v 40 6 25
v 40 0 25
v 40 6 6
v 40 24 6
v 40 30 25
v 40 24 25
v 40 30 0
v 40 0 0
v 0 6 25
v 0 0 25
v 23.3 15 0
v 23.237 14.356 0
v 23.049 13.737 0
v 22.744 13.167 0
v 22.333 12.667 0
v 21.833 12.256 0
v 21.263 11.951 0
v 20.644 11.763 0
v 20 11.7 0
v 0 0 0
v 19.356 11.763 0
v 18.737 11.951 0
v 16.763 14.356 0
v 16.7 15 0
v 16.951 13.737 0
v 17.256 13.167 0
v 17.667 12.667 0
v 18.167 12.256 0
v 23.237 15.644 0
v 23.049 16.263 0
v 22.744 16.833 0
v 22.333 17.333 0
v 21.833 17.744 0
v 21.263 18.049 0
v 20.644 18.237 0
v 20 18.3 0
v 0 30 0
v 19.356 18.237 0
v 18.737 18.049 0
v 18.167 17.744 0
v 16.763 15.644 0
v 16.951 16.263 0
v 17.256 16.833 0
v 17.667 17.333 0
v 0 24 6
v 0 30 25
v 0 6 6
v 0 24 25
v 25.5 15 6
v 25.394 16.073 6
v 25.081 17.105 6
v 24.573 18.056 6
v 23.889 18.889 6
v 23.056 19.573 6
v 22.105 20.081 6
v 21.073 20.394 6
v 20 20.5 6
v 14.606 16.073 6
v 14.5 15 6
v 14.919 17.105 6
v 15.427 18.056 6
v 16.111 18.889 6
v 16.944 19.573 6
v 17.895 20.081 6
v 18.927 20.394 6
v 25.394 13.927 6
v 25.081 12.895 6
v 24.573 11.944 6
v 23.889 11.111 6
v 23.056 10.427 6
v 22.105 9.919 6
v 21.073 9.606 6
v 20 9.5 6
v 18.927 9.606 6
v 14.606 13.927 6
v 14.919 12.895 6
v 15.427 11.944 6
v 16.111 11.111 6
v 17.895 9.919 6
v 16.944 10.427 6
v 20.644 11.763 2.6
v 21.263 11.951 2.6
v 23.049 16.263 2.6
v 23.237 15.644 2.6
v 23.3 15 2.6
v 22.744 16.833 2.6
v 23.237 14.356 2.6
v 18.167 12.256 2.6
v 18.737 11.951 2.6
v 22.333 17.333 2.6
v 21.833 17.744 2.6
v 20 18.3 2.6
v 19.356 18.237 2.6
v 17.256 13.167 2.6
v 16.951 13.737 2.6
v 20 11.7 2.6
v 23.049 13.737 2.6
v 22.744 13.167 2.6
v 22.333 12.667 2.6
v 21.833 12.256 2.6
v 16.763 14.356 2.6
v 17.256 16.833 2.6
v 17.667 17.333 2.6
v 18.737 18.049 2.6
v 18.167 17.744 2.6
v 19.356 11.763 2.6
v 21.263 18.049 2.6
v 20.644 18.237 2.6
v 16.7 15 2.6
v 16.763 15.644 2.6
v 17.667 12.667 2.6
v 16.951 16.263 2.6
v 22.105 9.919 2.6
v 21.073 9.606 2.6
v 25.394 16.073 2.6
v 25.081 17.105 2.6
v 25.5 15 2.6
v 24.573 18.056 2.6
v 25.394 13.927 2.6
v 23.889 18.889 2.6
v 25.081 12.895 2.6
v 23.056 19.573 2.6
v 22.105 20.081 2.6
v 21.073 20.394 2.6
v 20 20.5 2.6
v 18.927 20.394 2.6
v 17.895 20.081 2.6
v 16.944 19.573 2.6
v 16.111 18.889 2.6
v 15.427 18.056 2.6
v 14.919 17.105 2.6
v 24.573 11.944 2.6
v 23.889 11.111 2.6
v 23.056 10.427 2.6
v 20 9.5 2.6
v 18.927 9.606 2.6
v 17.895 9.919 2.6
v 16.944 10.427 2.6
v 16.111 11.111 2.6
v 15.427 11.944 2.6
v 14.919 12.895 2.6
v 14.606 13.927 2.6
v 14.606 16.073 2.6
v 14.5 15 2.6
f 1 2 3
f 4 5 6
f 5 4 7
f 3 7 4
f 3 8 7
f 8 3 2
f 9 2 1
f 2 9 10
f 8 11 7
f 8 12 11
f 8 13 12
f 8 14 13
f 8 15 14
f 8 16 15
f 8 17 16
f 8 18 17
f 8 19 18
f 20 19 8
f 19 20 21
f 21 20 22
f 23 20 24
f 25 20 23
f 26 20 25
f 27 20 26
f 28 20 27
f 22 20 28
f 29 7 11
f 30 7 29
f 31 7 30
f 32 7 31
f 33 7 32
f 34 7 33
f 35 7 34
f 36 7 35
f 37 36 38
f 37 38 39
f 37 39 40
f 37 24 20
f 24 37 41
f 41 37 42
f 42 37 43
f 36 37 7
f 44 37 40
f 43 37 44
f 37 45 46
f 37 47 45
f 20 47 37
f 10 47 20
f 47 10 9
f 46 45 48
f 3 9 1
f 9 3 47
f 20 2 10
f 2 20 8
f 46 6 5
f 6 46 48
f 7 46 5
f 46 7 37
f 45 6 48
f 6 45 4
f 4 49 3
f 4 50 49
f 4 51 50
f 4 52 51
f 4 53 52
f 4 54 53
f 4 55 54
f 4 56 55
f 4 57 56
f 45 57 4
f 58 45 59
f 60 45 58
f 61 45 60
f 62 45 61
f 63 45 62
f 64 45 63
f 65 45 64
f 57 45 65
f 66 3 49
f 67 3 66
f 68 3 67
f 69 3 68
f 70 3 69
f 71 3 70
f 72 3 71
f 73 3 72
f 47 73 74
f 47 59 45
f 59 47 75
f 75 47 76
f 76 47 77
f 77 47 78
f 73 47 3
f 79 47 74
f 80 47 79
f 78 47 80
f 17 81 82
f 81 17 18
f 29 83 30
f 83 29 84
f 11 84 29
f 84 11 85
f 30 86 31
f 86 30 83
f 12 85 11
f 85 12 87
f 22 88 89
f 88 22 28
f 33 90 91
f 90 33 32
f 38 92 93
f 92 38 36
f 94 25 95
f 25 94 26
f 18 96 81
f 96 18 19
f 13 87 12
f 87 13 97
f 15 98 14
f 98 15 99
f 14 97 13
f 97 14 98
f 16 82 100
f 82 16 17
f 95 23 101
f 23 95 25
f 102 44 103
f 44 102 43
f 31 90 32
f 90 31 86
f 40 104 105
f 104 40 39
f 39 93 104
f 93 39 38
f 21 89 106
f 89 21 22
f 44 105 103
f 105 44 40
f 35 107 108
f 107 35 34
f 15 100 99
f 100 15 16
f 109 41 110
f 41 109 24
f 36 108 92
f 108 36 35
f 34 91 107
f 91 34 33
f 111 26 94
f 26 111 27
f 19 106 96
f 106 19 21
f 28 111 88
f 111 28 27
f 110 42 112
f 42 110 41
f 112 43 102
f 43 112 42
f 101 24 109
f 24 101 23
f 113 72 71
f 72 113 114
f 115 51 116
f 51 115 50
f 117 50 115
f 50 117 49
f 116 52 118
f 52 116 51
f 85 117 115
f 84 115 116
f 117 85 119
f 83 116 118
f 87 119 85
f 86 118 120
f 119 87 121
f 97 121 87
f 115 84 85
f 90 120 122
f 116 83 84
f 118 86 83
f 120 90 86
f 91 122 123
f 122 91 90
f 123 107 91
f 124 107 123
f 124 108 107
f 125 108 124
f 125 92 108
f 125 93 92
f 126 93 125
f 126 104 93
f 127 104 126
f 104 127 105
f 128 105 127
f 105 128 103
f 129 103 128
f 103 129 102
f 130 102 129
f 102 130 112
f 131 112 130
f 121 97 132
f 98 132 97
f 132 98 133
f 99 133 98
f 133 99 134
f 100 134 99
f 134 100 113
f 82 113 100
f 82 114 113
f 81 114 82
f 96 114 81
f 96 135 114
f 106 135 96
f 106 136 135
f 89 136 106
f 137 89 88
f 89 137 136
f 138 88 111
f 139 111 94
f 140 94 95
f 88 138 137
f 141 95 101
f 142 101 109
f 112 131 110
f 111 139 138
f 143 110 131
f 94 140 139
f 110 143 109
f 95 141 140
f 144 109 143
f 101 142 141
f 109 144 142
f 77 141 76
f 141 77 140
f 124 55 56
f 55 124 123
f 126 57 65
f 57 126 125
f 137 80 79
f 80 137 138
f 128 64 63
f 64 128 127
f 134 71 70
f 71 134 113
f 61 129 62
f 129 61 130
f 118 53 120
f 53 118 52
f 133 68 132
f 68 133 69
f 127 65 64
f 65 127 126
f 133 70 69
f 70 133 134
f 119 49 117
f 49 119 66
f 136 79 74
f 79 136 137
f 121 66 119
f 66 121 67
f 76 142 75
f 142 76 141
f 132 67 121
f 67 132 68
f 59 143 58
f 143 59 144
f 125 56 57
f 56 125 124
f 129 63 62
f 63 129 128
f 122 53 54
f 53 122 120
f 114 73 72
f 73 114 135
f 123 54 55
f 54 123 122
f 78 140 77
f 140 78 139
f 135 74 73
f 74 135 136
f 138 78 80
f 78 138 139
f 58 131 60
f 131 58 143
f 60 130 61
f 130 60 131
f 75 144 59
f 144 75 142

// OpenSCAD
$fn = 32;

// ----------------------------------------------------------------------
// U-bracket: 40 x 30 x 25 mm
// ----------------------------------------------------------------------

// --- parameters (mm) ---
rail_len = 40;            // outer length, X
jaw_w = 30;               // outer width, Y
jaw_h = 25;               // upright height, Z
web_t = 6;                // wall thickness
hole_d = 6.6;             // clearance for M6
cb_d = 11;                // counterbore diameter
cb_h = 3.4;               // counterbore depth

module hole_z(px, py) {
  translate([px, py, -0.5]) cylinder(h = web_t + 1, d = hole_d);
}
module hole_y_pz(pz) {
  /* through both uprights along Y */
  translate([0, -0.5, pz]) rotate([-90, 0, 0]) cylinder(h = jaw_w + 1, d = hole_d);
}
module cb_z(px, py) {
  translate([px, py, web_t - cb_h]) cylinder(h = cb_h + 0.4, d = cb_d);
}

module base() {
  cube([rail_len, jaw_w, web_t]);
}

module uprights() {
  cube([rail_len, web_t, jaw_h]);
  translate([0, jaw_w - web_t, 0]) cube([rail_len, web_t, jaw_h]);
}

difference() {
  union() {
    base();
    uprights();
  }
  hole_z(20, 15);
  cb_z(20, 15);
}
